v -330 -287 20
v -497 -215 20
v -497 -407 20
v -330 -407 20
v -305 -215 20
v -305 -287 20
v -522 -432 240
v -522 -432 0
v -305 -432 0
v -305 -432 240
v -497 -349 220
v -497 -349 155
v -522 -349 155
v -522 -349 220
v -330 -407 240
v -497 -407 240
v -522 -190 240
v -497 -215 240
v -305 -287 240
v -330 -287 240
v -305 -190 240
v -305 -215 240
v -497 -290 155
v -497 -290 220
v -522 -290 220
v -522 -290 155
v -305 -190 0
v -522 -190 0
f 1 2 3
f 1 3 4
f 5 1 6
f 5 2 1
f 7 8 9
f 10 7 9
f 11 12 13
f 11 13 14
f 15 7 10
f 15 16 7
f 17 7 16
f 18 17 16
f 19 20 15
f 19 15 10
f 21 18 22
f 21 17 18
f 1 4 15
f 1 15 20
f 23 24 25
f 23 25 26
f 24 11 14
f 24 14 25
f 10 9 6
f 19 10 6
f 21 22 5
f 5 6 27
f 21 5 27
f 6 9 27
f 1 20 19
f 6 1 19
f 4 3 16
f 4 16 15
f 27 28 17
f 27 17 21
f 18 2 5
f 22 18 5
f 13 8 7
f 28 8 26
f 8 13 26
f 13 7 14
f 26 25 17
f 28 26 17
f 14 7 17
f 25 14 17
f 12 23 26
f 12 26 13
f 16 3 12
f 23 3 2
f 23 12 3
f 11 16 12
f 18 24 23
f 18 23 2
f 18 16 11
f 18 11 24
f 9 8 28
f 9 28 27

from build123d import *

# Parameters (mm, degrees)
F2_DEPTH  = 20
F3_W      = 217
F3_H      = 242
F3_W_2    = 167
F3_H_2    = 192
F4_DEPTH  = 240
F5_W      = 48
F5_H      = 72
F6_DEPTH  = 250
F7_W      = 79
F7_H      = 85
F8_DEPTH  = 25
F10_DEPTH = 25


with BuildPart() as f2:
    # F1 (on face) → F2 (new body)
    with BuildSketch(Plane.XY):
        Polygon((-497, -215), (-497, -231), (-497, -293), (-497, -407), (-330, -407), (-330, -287), (-330, -215), align=None)
    extrude(amount=F2_DEPTH)

    # F3 (on face) → F4 (join)
    with BuildSketch(Plane.XY):
        with Locations((-413.5, -311)):
            Rectangle(F3_W, F3_H)
        with Locations((-413.5, -311)):
            Rectangle(F3_W_2, F3_H_2, mode=Mode.SUBTRACT)
    extrude(amount=F4_DEPTH)

    # F5 (on face) → F6 (cut)
    with BuildSketch(Plane.XY.offset(20)):
        with Locations((-306, -251)):
            Rectangle(F5_W, F5_H)
    extrude(amount=F6_DEPTH, mode=Mode.SUBTRACT)

    # F7 (on face) → F8 (cut)
    with BuildSketch(Plane.YZ.offset(-497)):
        with Locations((-309.5, 177.5)):
            Rectangle(F7_W, F7_H)
    extrude(amount=-F8_DEPTH, mode=Mode.SUBTRACT)

    # F9 (on face) → F10 (join, through all)
    with BuildSketch(Plane.YZ.offset(-497)):
        Polygon((-270, 135), (-270, 220), (-290, 220), (-290, 155), (-349, 155), (-349, 135), align=None)
    extrude(amount=-F10_DEPTH)


solid = f2.part
